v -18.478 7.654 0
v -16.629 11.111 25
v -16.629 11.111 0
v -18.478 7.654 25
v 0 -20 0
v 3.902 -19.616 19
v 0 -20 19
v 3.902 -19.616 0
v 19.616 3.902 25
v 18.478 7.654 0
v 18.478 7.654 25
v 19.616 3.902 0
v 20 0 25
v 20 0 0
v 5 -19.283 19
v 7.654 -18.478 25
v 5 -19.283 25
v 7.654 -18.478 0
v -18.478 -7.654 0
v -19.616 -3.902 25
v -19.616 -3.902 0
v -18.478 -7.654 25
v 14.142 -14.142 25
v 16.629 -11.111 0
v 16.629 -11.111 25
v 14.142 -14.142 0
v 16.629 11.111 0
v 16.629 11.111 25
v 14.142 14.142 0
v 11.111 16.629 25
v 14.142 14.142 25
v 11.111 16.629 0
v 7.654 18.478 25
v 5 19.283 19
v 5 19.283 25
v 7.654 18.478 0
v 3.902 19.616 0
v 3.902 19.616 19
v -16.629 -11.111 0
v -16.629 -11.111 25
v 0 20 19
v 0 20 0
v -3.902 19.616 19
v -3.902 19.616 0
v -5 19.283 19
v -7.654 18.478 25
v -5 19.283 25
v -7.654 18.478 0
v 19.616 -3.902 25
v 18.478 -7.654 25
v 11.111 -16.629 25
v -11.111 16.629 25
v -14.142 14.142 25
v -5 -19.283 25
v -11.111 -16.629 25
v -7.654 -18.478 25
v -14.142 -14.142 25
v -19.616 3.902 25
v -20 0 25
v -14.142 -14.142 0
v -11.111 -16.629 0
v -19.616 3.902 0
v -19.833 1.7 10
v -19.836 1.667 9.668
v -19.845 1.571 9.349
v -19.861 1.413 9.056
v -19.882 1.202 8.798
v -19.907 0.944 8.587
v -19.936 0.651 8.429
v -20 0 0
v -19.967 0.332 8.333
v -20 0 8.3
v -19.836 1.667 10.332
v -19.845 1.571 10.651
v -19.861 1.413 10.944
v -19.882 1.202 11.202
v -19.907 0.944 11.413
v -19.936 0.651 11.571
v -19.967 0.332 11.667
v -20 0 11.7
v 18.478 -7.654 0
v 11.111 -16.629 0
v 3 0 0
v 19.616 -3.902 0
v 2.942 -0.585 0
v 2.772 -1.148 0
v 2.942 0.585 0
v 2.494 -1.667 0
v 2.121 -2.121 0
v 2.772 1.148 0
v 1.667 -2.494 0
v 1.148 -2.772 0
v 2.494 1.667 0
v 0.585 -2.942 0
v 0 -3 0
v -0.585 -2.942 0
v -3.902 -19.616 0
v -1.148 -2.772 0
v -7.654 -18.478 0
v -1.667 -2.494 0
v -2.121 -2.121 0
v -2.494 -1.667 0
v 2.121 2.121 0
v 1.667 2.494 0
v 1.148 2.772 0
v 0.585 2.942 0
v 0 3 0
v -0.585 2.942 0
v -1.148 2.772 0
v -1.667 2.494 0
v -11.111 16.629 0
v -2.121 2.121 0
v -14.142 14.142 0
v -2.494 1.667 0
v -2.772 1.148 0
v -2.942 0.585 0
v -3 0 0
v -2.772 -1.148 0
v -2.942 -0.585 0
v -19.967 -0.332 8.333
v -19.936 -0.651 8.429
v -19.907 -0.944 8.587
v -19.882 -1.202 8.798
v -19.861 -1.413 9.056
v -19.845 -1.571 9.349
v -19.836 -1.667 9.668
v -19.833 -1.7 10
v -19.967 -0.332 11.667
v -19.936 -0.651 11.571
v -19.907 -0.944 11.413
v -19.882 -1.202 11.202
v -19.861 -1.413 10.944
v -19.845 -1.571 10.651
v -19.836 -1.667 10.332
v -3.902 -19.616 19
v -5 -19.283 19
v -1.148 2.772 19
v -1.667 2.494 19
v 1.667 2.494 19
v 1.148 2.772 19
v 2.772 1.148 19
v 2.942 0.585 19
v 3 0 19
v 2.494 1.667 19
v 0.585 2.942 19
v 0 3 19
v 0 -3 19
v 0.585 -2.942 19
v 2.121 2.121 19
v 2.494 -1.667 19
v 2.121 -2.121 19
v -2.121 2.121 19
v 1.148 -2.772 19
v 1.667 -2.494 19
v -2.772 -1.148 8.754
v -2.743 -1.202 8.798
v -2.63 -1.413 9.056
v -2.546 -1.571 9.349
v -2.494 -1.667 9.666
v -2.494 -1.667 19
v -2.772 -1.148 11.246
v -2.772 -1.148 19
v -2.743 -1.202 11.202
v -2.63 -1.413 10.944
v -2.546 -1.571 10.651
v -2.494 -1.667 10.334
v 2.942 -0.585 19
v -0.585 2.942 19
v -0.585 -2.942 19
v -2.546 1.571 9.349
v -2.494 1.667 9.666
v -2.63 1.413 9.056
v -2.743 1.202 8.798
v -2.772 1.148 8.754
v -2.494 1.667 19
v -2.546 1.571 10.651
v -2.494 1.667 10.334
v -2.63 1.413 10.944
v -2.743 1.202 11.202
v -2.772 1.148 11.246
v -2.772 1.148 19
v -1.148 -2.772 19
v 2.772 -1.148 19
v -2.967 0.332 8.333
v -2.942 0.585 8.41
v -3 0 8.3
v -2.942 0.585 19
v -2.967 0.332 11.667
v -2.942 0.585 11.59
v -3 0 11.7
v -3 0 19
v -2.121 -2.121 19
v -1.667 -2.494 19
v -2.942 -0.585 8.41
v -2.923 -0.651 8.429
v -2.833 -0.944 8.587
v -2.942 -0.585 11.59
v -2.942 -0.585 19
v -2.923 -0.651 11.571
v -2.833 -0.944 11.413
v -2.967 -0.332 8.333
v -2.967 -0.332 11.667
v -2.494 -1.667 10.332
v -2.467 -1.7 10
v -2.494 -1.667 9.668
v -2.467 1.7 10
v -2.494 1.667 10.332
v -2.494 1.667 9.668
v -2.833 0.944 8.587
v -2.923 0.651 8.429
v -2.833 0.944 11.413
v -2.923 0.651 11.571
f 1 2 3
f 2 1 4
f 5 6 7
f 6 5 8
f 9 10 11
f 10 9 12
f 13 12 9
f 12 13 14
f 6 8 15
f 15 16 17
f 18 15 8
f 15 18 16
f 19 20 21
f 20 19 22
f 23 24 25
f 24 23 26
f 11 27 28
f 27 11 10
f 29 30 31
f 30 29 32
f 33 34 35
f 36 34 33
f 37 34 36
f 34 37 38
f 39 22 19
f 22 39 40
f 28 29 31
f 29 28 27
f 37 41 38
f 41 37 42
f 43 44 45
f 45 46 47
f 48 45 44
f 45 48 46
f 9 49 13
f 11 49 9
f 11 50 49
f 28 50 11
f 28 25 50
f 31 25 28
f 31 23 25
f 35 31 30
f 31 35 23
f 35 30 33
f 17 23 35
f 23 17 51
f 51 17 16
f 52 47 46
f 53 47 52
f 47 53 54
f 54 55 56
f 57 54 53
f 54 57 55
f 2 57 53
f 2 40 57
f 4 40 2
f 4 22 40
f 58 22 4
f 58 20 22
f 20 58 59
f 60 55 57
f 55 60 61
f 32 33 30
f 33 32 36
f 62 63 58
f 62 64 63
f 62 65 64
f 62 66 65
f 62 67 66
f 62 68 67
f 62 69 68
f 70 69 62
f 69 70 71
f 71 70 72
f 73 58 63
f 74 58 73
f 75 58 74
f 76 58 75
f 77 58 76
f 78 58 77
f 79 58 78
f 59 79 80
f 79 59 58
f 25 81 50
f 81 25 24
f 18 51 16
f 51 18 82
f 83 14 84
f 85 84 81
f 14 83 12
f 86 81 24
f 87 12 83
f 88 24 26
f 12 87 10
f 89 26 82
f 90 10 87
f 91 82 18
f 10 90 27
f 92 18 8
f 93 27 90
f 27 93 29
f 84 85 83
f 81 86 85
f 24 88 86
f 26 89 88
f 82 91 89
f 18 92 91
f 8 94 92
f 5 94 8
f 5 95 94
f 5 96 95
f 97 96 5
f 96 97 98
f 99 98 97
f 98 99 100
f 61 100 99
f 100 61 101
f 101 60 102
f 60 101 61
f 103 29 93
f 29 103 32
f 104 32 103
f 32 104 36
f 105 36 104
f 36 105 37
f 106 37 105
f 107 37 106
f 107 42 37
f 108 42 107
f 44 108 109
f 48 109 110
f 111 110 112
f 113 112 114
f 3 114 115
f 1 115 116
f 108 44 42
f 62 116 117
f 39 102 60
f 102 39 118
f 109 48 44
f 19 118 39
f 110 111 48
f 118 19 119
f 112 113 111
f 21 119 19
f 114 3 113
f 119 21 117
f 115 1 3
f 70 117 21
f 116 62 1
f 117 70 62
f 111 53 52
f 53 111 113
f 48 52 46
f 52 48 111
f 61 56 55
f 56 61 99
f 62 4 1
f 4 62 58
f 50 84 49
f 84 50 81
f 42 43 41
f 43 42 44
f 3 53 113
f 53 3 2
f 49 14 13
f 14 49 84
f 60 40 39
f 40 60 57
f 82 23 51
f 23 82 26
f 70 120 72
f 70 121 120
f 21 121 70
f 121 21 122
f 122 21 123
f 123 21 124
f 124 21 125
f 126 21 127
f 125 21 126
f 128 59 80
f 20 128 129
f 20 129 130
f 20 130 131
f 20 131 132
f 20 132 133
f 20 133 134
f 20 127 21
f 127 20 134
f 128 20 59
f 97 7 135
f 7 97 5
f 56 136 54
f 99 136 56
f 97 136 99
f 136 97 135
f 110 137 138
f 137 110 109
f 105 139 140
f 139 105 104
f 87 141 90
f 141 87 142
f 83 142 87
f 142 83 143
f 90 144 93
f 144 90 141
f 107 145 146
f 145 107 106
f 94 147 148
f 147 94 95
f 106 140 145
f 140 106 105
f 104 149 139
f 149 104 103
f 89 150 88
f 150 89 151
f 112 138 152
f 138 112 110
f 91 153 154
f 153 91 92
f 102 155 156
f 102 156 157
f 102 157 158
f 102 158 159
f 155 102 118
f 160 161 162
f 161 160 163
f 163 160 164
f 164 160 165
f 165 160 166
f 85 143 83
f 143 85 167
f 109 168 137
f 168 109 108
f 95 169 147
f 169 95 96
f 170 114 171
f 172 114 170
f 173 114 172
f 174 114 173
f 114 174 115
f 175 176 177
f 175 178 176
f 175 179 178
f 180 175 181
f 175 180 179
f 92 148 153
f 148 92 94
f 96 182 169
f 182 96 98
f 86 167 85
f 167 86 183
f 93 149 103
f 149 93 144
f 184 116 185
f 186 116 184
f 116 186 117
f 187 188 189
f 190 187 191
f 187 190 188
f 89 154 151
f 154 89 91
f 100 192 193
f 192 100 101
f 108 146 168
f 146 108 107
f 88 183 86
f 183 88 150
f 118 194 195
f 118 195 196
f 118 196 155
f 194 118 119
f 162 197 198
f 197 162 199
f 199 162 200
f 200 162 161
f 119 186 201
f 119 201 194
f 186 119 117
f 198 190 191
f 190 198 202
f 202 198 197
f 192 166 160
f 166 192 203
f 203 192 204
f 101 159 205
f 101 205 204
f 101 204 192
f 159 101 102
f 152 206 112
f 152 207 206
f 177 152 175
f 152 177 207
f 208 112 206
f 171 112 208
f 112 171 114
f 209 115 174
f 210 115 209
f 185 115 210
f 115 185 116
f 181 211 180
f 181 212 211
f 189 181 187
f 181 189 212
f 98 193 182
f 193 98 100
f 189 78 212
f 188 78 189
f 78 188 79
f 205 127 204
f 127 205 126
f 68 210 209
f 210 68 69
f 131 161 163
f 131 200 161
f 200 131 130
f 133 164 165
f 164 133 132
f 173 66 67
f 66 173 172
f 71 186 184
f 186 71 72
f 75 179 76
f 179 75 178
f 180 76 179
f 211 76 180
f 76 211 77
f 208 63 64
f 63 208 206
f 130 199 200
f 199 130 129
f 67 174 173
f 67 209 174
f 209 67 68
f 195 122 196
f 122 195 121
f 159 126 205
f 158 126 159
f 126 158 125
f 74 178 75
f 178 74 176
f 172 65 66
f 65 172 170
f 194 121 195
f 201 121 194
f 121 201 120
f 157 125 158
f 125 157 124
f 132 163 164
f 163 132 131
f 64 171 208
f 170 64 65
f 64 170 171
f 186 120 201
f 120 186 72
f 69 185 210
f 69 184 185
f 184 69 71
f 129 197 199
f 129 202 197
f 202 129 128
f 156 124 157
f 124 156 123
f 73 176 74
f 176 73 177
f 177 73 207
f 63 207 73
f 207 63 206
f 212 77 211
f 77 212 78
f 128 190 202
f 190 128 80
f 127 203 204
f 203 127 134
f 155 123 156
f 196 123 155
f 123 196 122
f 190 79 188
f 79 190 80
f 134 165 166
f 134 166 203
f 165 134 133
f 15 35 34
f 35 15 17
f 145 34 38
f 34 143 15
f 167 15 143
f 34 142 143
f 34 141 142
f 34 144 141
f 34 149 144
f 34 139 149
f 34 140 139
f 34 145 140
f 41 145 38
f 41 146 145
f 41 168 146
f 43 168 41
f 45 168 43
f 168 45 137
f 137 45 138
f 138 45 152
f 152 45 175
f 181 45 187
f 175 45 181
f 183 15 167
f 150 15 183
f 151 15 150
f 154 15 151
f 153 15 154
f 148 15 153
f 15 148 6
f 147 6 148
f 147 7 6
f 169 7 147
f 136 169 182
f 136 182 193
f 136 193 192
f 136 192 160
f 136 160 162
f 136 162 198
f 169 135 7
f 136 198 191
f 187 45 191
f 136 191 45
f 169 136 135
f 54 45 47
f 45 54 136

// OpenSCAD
$fn = 32;

// ----------------------------------------------------------------------
// Oldham coupling hub: 40 x 25 mm
// ----------------------------------------------------------------------

// --- parameters (mm) ---
body_d = 40;              // hub diameter
body_l = 20;              // hub length
shaft_d = 6;              // shaft bore
cam_w = 10;               // drive tongue width
tongue_h = 5;             // drive tongue height
set_d = 3.4;              // set screw tap hole

module hub() {
  /* the slot side is a raised disc with a groove milled across it */
  cylinder(h = body_l + tongue_h, d = body_d);
}

difference() {
  hub();
  translate([0, 0, -1]) cylinder(h = body_l + tongue_h + 2, d = shaft_d);
  translate([-body_d / 2 - 1, 0, body_l * 0.5])
    rotate([0, 90, 0]) cylinder(h = body_d / 2 + 2, d = set_d);
  translate([-cam_w / 2, -body_d / 2 - 1, body_l - 1])
    cube([cam_w, body_d + 2, tongue_h + 1]);
}
